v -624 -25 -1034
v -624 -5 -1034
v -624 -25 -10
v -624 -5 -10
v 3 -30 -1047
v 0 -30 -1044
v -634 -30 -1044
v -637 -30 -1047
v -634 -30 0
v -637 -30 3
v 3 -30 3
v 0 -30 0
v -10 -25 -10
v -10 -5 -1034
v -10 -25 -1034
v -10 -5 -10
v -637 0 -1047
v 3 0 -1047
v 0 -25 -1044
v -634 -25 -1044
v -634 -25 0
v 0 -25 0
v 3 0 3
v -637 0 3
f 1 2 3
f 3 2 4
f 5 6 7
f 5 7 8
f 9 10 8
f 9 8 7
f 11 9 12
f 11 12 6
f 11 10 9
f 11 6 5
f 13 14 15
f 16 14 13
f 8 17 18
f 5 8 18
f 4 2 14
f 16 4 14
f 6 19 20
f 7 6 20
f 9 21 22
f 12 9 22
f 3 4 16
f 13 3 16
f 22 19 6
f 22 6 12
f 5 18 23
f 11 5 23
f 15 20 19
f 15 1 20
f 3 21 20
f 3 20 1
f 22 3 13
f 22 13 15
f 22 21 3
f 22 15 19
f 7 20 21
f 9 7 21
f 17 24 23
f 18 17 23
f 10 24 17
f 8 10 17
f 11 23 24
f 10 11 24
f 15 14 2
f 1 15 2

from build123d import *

# Parameters (mm, degrees)
F0_W     = 3
F0_H     = 1044
F1_DEPTH = 30
F2_W     = 634
F2_H     = 1044
F3_DEPTH = 5
F4_W     = 10
F4_H     = 1024
F5_DEPTH = 20


with BuildPart() as f1:
    # F0 (on Front) → F1 (new body)
    with BuildSketch(Plane.XZ):
        Polygon((-634, 0), (0, 0), (3, 0), (3, 3), (-637, 3), (-637, 0), align=None)
        with Locations((1.5, -522)):
            Rectangle(F0_W, F0_H)
        with Locations((-635.5, -522)):
            Rectangle(F0_W, F0_H)
        Polygon((3, -1044), (0, -1044), (-634, -1044), (-637, -1044), (-637, -1047), (3, -1047), align=None)
    extrude(amount=F1_DEPTH)

    # F2 (on Front) → F3 (join)
    with BuildSketch(Plane.XZ):
        with Locations((-317, -522)):
            Rectangle(F2_W, F2_H)
    extrude(amount=F3_DEPTH)

    # F4 (on face) → F5 (join)
    with BuildSketch(Plane.XZ.offset(5)):
        Polygon((0, -10), (0, 0), (-634, 0), (-634, -10), (-624, -10), (-10, -10), align=None)
        with Locations((-629, -522)):
            Rectangle(F4_W, F4_H)
        Polygon((0, -1044), (0, -1034), (-10, -1034), (-624, -1034), (-634, -1034), (-634, -1044), align=None)
        with Locations((-5, -522)):
            Rectangle(F4_W, F4_H)
    extrude(amount=F5_DEPTH)


solid = f1.part
